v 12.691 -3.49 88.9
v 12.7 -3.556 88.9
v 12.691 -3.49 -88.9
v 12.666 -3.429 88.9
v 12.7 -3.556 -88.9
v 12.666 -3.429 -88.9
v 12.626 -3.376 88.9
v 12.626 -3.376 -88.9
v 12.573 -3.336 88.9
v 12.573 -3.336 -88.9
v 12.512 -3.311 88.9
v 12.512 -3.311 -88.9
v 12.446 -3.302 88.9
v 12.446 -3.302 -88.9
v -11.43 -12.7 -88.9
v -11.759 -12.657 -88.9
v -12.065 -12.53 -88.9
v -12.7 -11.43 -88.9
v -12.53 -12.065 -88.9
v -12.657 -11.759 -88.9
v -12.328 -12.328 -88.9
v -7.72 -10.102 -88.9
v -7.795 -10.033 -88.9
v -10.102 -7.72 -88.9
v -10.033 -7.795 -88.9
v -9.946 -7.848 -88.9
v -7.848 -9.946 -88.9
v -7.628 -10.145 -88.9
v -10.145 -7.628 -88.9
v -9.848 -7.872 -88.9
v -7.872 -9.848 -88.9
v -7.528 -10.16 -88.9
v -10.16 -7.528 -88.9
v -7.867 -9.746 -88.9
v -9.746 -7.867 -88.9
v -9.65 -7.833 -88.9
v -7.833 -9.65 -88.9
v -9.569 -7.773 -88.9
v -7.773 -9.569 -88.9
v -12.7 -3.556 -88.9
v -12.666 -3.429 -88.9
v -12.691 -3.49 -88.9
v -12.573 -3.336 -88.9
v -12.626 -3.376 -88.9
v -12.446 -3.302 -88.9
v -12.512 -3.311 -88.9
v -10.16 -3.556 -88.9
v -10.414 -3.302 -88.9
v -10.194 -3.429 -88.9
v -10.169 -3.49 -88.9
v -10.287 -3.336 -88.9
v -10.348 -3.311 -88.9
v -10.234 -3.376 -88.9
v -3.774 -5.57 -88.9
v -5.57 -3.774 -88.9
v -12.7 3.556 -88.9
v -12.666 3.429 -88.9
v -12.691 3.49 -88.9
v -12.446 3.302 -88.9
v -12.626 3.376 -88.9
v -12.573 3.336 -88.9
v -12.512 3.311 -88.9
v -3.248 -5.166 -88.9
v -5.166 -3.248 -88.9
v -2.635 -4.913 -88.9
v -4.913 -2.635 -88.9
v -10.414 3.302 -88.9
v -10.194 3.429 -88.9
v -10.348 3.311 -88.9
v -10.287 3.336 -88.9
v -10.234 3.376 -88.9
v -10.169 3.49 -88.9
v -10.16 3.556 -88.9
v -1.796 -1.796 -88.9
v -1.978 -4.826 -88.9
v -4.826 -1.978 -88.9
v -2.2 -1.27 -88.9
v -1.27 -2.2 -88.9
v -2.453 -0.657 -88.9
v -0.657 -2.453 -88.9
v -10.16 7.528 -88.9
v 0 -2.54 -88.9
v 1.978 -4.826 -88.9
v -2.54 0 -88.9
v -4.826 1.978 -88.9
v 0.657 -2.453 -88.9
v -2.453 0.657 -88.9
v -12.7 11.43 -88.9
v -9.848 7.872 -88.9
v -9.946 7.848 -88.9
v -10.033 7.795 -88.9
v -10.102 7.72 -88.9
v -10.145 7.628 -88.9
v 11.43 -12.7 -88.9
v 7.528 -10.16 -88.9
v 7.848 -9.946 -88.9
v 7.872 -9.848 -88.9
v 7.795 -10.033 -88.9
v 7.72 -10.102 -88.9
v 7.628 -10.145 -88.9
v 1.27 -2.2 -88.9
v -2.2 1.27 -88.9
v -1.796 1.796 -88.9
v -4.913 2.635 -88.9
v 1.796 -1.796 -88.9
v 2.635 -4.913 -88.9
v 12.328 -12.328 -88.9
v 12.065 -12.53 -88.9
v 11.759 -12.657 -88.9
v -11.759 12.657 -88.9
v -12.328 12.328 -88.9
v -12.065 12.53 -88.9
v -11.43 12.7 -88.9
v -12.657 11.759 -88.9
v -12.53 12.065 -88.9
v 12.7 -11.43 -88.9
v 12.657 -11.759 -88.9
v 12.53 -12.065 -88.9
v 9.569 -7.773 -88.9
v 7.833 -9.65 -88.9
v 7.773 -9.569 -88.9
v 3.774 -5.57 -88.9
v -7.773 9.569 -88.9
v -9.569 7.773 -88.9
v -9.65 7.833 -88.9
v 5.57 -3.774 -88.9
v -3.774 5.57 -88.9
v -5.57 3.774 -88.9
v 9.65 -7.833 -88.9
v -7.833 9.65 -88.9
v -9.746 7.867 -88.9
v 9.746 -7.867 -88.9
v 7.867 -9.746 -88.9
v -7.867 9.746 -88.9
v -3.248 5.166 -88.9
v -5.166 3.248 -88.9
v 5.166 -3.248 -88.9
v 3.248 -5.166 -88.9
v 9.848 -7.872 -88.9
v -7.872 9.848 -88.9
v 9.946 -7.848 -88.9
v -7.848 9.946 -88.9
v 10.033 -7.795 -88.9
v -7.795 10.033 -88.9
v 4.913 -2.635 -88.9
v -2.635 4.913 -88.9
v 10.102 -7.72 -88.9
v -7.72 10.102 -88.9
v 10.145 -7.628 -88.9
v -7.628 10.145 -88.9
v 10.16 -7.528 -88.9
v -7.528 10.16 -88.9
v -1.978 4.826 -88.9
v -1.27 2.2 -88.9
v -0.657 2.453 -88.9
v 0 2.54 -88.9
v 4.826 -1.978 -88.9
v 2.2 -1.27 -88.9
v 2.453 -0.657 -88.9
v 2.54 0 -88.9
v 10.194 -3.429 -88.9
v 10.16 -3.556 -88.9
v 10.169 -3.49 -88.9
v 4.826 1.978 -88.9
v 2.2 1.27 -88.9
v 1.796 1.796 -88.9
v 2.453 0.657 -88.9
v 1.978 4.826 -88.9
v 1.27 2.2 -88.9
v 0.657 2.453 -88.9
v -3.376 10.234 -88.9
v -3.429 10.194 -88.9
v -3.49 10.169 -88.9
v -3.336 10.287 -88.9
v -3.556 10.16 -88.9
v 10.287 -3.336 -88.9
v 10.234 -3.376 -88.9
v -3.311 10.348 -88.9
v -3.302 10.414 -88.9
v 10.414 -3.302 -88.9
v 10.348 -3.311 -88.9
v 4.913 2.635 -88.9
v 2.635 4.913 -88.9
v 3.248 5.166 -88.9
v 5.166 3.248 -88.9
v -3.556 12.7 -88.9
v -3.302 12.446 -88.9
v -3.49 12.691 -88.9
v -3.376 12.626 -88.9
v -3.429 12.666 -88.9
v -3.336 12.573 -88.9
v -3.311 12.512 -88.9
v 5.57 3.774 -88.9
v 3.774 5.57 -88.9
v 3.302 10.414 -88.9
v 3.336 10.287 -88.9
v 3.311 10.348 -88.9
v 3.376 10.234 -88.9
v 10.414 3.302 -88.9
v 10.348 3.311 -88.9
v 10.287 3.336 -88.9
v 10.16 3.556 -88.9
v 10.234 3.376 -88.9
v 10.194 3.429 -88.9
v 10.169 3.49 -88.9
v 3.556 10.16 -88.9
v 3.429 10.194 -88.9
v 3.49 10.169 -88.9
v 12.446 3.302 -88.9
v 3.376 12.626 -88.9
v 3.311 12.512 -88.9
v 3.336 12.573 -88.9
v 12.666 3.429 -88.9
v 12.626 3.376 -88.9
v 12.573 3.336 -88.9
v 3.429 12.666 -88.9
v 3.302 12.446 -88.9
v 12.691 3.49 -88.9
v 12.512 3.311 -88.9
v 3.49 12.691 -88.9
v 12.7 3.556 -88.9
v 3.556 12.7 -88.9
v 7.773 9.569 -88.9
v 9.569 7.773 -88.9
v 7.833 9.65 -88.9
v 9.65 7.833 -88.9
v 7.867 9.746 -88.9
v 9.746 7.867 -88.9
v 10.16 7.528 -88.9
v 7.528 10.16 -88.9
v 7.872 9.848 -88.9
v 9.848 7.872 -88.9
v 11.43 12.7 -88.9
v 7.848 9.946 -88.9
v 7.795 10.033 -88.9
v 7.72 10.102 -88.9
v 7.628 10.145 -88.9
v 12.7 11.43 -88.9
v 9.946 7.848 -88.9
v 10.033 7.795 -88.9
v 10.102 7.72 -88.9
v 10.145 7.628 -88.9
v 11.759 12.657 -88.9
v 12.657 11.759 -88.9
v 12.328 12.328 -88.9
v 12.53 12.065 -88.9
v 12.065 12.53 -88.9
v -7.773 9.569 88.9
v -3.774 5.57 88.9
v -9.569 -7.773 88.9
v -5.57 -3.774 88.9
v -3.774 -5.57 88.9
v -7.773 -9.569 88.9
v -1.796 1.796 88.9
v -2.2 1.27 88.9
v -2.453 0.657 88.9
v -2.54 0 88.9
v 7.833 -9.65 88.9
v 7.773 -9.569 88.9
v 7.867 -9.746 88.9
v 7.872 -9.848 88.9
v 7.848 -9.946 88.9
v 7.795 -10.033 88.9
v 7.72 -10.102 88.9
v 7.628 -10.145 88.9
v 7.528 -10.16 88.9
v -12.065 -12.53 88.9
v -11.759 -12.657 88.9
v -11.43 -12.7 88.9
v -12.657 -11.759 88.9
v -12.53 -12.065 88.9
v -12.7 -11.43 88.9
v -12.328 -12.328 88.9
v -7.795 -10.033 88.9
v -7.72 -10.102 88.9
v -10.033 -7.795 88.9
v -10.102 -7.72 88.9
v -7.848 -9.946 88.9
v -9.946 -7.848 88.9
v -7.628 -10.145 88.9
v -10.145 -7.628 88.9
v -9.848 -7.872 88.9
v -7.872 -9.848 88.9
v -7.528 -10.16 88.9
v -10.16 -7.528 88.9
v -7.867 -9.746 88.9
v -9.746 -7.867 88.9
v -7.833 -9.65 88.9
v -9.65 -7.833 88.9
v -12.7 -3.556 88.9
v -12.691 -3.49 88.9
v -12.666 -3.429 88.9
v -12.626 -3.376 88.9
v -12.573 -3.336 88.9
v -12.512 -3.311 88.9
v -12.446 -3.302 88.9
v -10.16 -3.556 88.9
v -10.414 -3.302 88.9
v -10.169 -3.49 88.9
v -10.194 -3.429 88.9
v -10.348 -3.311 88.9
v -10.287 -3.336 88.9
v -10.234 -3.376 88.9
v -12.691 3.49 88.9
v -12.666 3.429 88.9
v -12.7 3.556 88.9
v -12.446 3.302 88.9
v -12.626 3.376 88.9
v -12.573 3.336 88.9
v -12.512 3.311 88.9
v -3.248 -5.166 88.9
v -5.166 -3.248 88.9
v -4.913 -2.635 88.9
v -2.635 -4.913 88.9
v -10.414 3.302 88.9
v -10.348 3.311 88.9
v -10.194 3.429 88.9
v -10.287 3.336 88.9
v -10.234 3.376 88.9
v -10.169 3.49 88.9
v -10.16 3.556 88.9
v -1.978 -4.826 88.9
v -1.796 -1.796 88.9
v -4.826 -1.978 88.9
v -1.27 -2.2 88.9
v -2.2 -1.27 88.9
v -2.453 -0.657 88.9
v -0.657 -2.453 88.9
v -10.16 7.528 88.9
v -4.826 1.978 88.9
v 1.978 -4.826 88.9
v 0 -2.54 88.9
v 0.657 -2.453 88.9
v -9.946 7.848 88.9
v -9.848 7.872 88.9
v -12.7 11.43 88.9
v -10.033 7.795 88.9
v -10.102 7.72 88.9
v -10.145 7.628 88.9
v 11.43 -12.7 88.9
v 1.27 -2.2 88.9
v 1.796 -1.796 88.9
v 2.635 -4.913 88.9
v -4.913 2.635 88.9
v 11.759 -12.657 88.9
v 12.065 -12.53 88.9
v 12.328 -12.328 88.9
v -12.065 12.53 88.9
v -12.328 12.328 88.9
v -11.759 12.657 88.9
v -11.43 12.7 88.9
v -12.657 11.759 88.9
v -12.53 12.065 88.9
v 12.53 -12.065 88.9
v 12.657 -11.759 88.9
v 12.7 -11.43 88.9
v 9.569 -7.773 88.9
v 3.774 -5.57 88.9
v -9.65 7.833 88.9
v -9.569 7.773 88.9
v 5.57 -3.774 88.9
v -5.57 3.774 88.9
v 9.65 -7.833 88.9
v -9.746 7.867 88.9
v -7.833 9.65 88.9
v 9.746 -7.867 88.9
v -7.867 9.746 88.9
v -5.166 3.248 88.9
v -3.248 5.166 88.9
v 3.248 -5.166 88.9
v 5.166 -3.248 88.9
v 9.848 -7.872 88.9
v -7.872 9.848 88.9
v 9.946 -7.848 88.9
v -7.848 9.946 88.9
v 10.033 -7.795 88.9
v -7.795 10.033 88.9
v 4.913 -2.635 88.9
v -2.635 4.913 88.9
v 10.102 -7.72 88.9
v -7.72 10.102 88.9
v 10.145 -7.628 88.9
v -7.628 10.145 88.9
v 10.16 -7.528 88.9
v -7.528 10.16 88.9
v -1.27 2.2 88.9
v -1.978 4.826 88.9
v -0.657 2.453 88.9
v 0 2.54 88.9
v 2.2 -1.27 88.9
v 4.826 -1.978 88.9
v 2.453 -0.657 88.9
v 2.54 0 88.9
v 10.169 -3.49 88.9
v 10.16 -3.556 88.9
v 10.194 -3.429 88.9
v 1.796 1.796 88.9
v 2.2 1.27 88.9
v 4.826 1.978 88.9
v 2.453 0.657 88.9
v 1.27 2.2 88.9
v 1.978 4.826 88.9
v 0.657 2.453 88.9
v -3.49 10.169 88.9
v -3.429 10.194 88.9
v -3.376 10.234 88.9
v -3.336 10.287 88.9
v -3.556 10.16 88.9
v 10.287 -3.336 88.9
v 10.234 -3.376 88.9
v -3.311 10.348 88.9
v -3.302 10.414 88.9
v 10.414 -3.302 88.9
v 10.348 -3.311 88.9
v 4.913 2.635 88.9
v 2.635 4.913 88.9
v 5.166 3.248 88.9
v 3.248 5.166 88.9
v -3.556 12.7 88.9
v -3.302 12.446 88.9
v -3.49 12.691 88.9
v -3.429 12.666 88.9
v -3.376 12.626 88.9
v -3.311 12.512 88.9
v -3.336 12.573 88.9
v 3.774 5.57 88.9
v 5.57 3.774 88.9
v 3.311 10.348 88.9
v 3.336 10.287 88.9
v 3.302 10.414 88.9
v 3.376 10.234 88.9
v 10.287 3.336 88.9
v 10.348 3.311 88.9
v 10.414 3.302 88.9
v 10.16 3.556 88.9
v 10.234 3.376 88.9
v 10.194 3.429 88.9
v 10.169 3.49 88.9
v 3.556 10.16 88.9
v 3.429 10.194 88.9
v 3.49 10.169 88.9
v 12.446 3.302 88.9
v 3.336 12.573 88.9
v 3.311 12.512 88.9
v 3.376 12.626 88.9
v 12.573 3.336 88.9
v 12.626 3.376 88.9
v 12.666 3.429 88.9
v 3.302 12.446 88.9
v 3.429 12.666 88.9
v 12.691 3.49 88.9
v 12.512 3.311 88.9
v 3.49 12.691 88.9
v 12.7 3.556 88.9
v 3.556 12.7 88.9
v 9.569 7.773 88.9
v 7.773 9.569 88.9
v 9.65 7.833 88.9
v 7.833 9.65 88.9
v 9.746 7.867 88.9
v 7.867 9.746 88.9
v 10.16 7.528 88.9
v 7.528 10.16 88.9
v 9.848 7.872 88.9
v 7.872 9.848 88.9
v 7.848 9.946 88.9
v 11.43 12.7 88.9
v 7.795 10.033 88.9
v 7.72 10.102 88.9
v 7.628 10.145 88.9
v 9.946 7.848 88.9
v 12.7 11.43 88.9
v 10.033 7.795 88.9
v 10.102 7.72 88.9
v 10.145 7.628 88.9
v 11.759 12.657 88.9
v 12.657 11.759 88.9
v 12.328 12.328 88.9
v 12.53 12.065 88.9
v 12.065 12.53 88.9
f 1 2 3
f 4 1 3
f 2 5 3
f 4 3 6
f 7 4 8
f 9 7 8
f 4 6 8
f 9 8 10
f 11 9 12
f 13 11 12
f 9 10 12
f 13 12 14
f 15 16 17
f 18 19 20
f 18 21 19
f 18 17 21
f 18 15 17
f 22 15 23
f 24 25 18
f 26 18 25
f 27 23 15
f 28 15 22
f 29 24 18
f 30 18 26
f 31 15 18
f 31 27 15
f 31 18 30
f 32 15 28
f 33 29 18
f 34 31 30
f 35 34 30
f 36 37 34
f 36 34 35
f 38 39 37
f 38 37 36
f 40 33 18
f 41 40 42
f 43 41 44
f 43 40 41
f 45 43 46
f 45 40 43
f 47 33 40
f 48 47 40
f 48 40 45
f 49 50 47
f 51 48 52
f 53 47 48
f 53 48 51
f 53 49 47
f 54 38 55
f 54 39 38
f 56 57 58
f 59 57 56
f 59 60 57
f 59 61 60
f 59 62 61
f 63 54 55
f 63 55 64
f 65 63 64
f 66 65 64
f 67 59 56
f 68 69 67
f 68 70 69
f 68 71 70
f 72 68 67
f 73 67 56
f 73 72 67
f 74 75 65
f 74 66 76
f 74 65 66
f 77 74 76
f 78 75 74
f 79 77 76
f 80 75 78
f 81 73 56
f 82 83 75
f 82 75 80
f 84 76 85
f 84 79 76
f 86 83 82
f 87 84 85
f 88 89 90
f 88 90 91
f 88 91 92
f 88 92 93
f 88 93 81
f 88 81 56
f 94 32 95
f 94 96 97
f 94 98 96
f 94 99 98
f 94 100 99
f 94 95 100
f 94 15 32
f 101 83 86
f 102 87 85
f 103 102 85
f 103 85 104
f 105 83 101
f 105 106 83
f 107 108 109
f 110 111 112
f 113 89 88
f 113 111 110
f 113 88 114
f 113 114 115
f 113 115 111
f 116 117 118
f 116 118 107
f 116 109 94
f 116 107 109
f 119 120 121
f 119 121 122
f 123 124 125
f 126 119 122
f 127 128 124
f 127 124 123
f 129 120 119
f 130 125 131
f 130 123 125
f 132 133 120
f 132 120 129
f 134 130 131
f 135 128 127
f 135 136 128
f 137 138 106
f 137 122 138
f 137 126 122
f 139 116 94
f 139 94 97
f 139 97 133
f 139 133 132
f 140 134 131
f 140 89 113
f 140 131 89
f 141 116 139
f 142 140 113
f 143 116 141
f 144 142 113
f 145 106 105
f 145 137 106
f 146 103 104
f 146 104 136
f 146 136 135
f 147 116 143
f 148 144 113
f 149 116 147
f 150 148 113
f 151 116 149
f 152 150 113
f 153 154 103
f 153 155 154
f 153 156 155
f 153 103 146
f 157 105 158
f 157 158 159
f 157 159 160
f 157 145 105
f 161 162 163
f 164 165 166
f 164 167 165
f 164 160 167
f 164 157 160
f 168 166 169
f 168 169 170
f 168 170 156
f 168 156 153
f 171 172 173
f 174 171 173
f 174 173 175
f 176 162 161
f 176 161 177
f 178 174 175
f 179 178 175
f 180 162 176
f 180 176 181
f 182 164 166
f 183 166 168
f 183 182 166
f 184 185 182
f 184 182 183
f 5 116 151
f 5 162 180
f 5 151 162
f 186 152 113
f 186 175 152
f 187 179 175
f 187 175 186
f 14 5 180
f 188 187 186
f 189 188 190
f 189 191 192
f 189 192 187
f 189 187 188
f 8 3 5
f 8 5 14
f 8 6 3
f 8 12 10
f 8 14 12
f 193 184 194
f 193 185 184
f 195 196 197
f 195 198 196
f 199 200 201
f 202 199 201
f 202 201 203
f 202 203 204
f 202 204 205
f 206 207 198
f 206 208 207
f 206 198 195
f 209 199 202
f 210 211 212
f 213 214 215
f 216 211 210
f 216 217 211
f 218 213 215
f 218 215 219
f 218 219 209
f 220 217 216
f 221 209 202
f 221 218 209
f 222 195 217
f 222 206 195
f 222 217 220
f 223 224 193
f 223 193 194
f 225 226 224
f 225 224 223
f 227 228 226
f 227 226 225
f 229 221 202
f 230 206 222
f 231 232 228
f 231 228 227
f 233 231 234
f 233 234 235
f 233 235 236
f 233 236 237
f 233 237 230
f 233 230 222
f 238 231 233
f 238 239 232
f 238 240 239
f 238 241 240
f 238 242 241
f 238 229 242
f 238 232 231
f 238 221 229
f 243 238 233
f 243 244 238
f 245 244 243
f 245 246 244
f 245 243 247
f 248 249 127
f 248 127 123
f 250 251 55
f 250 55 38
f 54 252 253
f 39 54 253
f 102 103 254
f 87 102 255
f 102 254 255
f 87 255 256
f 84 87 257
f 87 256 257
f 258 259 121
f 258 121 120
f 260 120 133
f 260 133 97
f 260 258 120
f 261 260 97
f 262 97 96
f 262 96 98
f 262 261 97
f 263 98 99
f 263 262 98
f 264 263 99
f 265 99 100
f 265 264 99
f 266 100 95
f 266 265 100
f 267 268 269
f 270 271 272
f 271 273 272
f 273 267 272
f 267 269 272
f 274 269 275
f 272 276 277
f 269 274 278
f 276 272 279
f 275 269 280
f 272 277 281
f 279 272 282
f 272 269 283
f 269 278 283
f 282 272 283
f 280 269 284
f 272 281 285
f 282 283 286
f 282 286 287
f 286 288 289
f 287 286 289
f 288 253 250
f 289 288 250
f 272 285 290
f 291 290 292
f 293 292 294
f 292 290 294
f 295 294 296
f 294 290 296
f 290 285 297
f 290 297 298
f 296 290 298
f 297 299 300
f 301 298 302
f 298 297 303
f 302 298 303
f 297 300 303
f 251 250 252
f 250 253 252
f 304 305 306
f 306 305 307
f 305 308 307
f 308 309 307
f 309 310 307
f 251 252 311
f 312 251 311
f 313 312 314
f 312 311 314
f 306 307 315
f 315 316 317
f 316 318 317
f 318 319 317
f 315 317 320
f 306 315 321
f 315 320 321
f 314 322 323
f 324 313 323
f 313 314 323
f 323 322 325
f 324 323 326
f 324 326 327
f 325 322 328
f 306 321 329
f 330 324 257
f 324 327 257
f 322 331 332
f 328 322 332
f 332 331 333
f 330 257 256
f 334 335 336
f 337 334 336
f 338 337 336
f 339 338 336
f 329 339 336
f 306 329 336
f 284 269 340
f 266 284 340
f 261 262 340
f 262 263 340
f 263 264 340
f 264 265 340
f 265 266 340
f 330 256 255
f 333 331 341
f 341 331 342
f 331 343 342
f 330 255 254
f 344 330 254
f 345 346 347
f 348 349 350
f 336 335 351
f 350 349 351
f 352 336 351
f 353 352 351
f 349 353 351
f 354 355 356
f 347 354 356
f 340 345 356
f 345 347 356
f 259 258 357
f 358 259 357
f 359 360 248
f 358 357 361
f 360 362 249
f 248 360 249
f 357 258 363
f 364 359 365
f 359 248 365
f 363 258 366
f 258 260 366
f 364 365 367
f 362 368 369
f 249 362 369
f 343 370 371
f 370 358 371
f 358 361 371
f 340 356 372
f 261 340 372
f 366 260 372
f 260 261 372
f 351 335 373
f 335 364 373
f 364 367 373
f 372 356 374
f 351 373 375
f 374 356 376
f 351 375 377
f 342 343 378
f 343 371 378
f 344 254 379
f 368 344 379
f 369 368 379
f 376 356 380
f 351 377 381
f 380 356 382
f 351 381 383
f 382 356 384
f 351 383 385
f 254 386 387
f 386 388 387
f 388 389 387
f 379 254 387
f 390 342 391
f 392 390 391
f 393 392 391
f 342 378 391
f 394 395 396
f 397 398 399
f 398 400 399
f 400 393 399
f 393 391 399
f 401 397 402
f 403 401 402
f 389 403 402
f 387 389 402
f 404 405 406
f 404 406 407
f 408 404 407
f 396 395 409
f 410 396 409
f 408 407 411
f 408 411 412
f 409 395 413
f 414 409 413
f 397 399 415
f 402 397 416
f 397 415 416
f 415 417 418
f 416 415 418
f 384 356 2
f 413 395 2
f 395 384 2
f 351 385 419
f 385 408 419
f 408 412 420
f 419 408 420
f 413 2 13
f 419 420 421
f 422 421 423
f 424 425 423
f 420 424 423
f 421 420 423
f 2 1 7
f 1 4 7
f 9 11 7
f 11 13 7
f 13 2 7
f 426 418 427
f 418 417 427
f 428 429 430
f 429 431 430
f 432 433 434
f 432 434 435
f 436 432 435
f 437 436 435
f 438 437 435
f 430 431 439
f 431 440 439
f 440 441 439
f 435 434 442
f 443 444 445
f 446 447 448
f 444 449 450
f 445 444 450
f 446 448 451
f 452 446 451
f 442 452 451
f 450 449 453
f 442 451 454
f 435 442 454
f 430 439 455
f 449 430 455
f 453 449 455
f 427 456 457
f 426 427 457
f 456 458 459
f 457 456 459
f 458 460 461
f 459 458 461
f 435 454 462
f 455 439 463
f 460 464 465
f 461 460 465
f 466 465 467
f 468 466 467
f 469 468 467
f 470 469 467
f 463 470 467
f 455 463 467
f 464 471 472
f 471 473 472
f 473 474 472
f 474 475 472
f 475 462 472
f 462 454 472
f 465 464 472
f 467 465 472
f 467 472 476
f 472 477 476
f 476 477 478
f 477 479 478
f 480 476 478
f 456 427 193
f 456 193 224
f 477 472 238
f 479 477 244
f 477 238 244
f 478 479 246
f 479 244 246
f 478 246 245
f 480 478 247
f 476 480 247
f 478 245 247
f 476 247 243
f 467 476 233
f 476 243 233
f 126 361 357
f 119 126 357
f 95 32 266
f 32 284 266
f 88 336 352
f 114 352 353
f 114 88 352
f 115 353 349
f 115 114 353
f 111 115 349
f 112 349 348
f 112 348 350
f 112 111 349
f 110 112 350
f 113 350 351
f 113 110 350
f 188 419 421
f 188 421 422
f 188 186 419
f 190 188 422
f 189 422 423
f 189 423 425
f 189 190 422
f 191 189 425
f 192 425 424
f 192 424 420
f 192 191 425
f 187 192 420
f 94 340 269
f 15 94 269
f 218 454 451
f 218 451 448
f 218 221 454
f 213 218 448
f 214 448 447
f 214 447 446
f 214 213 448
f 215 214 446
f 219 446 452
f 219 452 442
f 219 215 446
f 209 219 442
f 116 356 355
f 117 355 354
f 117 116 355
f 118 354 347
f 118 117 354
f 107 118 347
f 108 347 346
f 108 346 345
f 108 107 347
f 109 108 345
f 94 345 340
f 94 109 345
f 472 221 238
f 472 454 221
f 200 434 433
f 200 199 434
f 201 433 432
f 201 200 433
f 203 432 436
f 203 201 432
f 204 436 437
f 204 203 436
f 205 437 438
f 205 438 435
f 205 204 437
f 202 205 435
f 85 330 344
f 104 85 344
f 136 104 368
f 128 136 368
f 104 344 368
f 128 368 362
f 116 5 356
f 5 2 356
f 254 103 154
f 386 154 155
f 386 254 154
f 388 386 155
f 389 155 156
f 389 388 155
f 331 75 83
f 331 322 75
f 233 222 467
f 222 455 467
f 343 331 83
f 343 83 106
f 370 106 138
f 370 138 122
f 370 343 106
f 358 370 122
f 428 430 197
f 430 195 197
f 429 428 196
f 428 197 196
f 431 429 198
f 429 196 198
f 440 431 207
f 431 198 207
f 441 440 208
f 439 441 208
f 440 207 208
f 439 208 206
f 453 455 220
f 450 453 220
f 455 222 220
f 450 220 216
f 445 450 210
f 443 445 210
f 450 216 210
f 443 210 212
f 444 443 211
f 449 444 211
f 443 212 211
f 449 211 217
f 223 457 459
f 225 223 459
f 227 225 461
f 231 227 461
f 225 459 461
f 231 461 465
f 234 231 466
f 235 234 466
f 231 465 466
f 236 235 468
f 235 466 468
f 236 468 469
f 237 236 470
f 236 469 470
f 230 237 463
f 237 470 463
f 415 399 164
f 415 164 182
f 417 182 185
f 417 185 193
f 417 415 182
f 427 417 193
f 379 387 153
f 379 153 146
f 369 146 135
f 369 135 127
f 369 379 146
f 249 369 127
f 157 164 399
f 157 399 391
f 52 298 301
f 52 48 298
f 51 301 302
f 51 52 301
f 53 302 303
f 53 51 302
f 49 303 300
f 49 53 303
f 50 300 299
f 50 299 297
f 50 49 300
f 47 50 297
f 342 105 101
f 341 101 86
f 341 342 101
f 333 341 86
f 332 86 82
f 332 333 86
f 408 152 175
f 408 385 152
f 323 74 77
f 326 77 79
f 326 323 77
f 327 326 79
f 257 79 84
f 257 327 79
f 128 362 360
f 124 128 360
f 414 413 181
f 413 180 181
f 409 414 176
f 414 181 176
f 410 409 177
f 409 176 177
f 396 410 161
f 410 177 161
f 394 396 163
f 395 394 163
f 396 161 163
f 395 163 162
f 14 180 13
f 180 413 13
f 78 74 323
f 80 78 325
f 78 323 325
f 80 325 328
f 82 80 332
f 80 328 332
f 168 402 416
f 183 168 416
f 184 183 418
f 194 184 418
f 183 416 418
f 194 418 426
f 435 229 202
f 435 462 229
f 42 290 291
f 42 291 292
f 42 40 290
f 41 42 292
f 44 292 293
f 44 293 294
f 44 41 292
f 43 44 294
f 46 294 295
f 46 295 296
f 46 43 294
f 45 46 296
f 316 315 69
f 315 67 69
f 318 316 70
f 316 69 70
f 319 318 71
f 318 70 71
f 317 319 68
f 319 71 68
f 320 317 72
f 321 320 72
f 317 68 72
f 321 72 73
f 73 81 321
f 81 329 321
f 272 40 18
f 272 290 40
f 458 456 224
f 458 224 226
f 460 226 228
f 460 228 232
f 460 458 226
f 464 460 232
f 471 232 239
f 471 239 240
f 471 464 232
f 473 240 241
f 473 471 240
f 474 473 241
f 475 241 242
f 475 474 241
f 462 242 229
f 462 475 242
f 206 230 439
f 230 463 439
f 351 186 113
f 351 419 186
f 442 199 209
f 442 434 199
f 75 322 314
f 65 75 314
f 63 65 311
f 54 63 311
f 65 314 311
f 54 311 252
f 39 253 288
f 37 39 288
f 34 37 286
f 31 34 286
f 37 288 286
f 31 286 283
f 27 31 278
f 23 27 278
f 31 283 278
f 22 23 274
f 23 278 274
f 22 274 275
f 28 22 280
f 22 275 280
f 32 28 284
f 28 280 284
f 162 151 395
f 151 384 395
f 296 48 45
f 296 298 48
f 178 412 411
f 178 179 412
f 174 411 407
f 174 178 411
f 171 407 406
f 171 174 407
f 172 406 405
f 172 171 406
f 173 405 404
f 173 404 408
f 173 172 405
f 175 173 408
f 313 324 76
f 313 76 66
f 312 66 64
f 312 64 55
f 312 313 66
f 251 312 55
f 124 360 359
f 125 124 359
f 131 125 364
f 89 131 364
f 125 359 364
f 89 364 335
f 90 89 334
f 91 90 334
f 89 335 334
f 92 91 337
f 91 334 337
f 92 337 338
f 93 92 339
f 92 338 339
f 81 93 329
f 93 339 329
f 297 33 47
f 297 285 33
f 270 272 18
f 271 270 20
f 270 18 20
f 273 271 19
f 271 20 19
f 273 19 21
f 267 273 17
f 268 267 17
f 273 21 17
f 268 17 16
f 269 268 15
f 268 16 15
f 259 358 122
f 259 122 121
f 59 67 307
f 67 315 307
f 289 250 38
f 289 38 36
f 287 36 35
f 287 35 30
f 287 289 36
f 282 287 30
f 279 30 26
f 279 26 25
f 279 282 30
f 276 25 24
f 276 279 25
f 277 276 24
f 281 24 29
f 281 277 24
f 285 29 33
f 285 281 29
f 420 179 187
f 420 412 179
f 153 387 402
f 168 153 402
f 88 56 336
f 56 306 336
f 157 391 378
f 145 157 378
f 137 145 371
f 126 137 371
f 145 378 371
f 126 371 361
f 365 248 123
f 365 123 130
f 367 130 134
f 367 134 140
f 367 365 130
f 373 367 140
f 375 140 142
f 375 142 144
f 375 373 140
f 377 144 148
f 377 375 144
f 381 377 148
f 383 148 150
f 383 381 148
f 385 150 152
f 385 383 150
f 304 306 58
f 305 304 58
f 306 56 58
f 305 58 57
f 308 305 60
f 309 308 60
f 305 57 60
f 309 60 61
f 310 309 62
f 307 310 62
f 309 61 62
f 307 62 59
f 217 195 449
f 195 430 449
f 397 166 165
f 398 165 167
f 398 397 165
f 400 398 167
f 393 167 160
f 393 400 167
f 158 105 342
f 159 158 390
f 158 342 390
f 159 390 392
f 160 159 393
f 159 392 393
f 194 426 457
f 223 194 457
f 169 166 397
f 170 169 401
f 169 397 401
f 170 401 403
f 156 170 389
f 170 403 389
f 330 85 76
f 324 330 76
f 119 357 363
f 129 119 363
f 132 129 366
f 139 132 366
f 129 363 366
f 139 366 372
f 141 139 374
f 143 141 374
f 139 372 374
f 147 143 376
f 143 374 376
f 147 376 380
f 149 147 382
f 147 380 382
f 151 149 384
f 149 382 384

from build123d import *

# Parameters (mm, degrees)
BOSS_EXTRUDE1_DEPTH = 88.9
FILLET2_R           = 0.254
FILLET1_R           = 1.27
SKETCH5_W           = 7.112
SKETCH5_H           = 2.54
BOSS_EXTRUDE2_DEPTH = 177.8


with BuildPart() as part:
    # Sketch3 → Boss-Extrude1 (new body, symmetric)
    with BuildSketch(Plane.XY):
        with BuildLine():
            Line((-12.7, 12.7), (-1.796051224, 1.796051224))
            ThreePointArc((-1.796051224, 1.796051224), (-0.972015918, 2.346654013), (0, 2.54))
            Line((0, 2.54), (0, 4.826))
            Line((0, 4.826), (-1.977846327, 4.826))
            ThreePointArc((-1.977846327, 4.826), (-2.949862246, 5.019345987), (-3.773897552, 5.569948776))
            Line((-3.773897552, 5.569948776), (-7.772528286, 9.56857951))
            ThreePointArc((-7.772528286, 9.56857951), (-7.847628361, 9.946133082), (-7.527553898, 10.16))
            Line((-7.527553898, 10.16), (-3.302, 10.16))
            Line((-3.302, 10.16), (-3.302, 12.7))
            Line((-3.302, 12.7), (-12.7, 12.7))
        make_face()
    extrude(amount=BOSS_EXTRUDE1_DEPTH, both=True)

    # Fillet2
    fillet2_edges = [part.edges().sort_by_distance(p)[0] for p in [
        (-3.302, 12.7, 0),
        (-3.302, 10.16, 0),
    ]]
    fillet(fillet2_edges, radius=FILLET2_R)

    # Mirror1: part across plane


with BuildPart() as part_1:
    add(part.part)
    add(part.part.mirror(Plane(origin=(0, 0, 88.9), x_dir=(0, 0, 1), z_dir=(0.707106781, 0.707106781, 0))))

    # Fillet1
    fillet1_edges = [part_1.edges().sort_by_distance(p)[0] for p in [
        (-12.7, 12.7, 0),
    ]]
    fillet(fillet1_edges, radius=FILLET1_R)

    # Mirror2: part across plane


with BuildPart() as part_2:
    add(part_1.part)
    add(part_1.part.mirror(Plane(origin=(0, 0, 88.9), x_dir=(0, 0, 1), z_dir=(0, 1, 0))))

    # Mirror5: part across plane


with BuildPart() as part_3:
    add(part_2.part)
    add(part_2.part.mirror(Plane(origin=(0, 0, 88.9), x_dir=(0, 0, 1), z_dir=(-1, 0, 0))))

    # Sketch5 → Boss-Extrude2 (add, through all)
    with BuildSketch(Plane.XY.offset(88.9)):
        with Locations((0, -11.43)):
            Rectangle(SKETCH5_W, SKETCH5_H)
    extrude(amount=-BOSS_EXTRUDE2_DEPTH)


solid = part_3.part
